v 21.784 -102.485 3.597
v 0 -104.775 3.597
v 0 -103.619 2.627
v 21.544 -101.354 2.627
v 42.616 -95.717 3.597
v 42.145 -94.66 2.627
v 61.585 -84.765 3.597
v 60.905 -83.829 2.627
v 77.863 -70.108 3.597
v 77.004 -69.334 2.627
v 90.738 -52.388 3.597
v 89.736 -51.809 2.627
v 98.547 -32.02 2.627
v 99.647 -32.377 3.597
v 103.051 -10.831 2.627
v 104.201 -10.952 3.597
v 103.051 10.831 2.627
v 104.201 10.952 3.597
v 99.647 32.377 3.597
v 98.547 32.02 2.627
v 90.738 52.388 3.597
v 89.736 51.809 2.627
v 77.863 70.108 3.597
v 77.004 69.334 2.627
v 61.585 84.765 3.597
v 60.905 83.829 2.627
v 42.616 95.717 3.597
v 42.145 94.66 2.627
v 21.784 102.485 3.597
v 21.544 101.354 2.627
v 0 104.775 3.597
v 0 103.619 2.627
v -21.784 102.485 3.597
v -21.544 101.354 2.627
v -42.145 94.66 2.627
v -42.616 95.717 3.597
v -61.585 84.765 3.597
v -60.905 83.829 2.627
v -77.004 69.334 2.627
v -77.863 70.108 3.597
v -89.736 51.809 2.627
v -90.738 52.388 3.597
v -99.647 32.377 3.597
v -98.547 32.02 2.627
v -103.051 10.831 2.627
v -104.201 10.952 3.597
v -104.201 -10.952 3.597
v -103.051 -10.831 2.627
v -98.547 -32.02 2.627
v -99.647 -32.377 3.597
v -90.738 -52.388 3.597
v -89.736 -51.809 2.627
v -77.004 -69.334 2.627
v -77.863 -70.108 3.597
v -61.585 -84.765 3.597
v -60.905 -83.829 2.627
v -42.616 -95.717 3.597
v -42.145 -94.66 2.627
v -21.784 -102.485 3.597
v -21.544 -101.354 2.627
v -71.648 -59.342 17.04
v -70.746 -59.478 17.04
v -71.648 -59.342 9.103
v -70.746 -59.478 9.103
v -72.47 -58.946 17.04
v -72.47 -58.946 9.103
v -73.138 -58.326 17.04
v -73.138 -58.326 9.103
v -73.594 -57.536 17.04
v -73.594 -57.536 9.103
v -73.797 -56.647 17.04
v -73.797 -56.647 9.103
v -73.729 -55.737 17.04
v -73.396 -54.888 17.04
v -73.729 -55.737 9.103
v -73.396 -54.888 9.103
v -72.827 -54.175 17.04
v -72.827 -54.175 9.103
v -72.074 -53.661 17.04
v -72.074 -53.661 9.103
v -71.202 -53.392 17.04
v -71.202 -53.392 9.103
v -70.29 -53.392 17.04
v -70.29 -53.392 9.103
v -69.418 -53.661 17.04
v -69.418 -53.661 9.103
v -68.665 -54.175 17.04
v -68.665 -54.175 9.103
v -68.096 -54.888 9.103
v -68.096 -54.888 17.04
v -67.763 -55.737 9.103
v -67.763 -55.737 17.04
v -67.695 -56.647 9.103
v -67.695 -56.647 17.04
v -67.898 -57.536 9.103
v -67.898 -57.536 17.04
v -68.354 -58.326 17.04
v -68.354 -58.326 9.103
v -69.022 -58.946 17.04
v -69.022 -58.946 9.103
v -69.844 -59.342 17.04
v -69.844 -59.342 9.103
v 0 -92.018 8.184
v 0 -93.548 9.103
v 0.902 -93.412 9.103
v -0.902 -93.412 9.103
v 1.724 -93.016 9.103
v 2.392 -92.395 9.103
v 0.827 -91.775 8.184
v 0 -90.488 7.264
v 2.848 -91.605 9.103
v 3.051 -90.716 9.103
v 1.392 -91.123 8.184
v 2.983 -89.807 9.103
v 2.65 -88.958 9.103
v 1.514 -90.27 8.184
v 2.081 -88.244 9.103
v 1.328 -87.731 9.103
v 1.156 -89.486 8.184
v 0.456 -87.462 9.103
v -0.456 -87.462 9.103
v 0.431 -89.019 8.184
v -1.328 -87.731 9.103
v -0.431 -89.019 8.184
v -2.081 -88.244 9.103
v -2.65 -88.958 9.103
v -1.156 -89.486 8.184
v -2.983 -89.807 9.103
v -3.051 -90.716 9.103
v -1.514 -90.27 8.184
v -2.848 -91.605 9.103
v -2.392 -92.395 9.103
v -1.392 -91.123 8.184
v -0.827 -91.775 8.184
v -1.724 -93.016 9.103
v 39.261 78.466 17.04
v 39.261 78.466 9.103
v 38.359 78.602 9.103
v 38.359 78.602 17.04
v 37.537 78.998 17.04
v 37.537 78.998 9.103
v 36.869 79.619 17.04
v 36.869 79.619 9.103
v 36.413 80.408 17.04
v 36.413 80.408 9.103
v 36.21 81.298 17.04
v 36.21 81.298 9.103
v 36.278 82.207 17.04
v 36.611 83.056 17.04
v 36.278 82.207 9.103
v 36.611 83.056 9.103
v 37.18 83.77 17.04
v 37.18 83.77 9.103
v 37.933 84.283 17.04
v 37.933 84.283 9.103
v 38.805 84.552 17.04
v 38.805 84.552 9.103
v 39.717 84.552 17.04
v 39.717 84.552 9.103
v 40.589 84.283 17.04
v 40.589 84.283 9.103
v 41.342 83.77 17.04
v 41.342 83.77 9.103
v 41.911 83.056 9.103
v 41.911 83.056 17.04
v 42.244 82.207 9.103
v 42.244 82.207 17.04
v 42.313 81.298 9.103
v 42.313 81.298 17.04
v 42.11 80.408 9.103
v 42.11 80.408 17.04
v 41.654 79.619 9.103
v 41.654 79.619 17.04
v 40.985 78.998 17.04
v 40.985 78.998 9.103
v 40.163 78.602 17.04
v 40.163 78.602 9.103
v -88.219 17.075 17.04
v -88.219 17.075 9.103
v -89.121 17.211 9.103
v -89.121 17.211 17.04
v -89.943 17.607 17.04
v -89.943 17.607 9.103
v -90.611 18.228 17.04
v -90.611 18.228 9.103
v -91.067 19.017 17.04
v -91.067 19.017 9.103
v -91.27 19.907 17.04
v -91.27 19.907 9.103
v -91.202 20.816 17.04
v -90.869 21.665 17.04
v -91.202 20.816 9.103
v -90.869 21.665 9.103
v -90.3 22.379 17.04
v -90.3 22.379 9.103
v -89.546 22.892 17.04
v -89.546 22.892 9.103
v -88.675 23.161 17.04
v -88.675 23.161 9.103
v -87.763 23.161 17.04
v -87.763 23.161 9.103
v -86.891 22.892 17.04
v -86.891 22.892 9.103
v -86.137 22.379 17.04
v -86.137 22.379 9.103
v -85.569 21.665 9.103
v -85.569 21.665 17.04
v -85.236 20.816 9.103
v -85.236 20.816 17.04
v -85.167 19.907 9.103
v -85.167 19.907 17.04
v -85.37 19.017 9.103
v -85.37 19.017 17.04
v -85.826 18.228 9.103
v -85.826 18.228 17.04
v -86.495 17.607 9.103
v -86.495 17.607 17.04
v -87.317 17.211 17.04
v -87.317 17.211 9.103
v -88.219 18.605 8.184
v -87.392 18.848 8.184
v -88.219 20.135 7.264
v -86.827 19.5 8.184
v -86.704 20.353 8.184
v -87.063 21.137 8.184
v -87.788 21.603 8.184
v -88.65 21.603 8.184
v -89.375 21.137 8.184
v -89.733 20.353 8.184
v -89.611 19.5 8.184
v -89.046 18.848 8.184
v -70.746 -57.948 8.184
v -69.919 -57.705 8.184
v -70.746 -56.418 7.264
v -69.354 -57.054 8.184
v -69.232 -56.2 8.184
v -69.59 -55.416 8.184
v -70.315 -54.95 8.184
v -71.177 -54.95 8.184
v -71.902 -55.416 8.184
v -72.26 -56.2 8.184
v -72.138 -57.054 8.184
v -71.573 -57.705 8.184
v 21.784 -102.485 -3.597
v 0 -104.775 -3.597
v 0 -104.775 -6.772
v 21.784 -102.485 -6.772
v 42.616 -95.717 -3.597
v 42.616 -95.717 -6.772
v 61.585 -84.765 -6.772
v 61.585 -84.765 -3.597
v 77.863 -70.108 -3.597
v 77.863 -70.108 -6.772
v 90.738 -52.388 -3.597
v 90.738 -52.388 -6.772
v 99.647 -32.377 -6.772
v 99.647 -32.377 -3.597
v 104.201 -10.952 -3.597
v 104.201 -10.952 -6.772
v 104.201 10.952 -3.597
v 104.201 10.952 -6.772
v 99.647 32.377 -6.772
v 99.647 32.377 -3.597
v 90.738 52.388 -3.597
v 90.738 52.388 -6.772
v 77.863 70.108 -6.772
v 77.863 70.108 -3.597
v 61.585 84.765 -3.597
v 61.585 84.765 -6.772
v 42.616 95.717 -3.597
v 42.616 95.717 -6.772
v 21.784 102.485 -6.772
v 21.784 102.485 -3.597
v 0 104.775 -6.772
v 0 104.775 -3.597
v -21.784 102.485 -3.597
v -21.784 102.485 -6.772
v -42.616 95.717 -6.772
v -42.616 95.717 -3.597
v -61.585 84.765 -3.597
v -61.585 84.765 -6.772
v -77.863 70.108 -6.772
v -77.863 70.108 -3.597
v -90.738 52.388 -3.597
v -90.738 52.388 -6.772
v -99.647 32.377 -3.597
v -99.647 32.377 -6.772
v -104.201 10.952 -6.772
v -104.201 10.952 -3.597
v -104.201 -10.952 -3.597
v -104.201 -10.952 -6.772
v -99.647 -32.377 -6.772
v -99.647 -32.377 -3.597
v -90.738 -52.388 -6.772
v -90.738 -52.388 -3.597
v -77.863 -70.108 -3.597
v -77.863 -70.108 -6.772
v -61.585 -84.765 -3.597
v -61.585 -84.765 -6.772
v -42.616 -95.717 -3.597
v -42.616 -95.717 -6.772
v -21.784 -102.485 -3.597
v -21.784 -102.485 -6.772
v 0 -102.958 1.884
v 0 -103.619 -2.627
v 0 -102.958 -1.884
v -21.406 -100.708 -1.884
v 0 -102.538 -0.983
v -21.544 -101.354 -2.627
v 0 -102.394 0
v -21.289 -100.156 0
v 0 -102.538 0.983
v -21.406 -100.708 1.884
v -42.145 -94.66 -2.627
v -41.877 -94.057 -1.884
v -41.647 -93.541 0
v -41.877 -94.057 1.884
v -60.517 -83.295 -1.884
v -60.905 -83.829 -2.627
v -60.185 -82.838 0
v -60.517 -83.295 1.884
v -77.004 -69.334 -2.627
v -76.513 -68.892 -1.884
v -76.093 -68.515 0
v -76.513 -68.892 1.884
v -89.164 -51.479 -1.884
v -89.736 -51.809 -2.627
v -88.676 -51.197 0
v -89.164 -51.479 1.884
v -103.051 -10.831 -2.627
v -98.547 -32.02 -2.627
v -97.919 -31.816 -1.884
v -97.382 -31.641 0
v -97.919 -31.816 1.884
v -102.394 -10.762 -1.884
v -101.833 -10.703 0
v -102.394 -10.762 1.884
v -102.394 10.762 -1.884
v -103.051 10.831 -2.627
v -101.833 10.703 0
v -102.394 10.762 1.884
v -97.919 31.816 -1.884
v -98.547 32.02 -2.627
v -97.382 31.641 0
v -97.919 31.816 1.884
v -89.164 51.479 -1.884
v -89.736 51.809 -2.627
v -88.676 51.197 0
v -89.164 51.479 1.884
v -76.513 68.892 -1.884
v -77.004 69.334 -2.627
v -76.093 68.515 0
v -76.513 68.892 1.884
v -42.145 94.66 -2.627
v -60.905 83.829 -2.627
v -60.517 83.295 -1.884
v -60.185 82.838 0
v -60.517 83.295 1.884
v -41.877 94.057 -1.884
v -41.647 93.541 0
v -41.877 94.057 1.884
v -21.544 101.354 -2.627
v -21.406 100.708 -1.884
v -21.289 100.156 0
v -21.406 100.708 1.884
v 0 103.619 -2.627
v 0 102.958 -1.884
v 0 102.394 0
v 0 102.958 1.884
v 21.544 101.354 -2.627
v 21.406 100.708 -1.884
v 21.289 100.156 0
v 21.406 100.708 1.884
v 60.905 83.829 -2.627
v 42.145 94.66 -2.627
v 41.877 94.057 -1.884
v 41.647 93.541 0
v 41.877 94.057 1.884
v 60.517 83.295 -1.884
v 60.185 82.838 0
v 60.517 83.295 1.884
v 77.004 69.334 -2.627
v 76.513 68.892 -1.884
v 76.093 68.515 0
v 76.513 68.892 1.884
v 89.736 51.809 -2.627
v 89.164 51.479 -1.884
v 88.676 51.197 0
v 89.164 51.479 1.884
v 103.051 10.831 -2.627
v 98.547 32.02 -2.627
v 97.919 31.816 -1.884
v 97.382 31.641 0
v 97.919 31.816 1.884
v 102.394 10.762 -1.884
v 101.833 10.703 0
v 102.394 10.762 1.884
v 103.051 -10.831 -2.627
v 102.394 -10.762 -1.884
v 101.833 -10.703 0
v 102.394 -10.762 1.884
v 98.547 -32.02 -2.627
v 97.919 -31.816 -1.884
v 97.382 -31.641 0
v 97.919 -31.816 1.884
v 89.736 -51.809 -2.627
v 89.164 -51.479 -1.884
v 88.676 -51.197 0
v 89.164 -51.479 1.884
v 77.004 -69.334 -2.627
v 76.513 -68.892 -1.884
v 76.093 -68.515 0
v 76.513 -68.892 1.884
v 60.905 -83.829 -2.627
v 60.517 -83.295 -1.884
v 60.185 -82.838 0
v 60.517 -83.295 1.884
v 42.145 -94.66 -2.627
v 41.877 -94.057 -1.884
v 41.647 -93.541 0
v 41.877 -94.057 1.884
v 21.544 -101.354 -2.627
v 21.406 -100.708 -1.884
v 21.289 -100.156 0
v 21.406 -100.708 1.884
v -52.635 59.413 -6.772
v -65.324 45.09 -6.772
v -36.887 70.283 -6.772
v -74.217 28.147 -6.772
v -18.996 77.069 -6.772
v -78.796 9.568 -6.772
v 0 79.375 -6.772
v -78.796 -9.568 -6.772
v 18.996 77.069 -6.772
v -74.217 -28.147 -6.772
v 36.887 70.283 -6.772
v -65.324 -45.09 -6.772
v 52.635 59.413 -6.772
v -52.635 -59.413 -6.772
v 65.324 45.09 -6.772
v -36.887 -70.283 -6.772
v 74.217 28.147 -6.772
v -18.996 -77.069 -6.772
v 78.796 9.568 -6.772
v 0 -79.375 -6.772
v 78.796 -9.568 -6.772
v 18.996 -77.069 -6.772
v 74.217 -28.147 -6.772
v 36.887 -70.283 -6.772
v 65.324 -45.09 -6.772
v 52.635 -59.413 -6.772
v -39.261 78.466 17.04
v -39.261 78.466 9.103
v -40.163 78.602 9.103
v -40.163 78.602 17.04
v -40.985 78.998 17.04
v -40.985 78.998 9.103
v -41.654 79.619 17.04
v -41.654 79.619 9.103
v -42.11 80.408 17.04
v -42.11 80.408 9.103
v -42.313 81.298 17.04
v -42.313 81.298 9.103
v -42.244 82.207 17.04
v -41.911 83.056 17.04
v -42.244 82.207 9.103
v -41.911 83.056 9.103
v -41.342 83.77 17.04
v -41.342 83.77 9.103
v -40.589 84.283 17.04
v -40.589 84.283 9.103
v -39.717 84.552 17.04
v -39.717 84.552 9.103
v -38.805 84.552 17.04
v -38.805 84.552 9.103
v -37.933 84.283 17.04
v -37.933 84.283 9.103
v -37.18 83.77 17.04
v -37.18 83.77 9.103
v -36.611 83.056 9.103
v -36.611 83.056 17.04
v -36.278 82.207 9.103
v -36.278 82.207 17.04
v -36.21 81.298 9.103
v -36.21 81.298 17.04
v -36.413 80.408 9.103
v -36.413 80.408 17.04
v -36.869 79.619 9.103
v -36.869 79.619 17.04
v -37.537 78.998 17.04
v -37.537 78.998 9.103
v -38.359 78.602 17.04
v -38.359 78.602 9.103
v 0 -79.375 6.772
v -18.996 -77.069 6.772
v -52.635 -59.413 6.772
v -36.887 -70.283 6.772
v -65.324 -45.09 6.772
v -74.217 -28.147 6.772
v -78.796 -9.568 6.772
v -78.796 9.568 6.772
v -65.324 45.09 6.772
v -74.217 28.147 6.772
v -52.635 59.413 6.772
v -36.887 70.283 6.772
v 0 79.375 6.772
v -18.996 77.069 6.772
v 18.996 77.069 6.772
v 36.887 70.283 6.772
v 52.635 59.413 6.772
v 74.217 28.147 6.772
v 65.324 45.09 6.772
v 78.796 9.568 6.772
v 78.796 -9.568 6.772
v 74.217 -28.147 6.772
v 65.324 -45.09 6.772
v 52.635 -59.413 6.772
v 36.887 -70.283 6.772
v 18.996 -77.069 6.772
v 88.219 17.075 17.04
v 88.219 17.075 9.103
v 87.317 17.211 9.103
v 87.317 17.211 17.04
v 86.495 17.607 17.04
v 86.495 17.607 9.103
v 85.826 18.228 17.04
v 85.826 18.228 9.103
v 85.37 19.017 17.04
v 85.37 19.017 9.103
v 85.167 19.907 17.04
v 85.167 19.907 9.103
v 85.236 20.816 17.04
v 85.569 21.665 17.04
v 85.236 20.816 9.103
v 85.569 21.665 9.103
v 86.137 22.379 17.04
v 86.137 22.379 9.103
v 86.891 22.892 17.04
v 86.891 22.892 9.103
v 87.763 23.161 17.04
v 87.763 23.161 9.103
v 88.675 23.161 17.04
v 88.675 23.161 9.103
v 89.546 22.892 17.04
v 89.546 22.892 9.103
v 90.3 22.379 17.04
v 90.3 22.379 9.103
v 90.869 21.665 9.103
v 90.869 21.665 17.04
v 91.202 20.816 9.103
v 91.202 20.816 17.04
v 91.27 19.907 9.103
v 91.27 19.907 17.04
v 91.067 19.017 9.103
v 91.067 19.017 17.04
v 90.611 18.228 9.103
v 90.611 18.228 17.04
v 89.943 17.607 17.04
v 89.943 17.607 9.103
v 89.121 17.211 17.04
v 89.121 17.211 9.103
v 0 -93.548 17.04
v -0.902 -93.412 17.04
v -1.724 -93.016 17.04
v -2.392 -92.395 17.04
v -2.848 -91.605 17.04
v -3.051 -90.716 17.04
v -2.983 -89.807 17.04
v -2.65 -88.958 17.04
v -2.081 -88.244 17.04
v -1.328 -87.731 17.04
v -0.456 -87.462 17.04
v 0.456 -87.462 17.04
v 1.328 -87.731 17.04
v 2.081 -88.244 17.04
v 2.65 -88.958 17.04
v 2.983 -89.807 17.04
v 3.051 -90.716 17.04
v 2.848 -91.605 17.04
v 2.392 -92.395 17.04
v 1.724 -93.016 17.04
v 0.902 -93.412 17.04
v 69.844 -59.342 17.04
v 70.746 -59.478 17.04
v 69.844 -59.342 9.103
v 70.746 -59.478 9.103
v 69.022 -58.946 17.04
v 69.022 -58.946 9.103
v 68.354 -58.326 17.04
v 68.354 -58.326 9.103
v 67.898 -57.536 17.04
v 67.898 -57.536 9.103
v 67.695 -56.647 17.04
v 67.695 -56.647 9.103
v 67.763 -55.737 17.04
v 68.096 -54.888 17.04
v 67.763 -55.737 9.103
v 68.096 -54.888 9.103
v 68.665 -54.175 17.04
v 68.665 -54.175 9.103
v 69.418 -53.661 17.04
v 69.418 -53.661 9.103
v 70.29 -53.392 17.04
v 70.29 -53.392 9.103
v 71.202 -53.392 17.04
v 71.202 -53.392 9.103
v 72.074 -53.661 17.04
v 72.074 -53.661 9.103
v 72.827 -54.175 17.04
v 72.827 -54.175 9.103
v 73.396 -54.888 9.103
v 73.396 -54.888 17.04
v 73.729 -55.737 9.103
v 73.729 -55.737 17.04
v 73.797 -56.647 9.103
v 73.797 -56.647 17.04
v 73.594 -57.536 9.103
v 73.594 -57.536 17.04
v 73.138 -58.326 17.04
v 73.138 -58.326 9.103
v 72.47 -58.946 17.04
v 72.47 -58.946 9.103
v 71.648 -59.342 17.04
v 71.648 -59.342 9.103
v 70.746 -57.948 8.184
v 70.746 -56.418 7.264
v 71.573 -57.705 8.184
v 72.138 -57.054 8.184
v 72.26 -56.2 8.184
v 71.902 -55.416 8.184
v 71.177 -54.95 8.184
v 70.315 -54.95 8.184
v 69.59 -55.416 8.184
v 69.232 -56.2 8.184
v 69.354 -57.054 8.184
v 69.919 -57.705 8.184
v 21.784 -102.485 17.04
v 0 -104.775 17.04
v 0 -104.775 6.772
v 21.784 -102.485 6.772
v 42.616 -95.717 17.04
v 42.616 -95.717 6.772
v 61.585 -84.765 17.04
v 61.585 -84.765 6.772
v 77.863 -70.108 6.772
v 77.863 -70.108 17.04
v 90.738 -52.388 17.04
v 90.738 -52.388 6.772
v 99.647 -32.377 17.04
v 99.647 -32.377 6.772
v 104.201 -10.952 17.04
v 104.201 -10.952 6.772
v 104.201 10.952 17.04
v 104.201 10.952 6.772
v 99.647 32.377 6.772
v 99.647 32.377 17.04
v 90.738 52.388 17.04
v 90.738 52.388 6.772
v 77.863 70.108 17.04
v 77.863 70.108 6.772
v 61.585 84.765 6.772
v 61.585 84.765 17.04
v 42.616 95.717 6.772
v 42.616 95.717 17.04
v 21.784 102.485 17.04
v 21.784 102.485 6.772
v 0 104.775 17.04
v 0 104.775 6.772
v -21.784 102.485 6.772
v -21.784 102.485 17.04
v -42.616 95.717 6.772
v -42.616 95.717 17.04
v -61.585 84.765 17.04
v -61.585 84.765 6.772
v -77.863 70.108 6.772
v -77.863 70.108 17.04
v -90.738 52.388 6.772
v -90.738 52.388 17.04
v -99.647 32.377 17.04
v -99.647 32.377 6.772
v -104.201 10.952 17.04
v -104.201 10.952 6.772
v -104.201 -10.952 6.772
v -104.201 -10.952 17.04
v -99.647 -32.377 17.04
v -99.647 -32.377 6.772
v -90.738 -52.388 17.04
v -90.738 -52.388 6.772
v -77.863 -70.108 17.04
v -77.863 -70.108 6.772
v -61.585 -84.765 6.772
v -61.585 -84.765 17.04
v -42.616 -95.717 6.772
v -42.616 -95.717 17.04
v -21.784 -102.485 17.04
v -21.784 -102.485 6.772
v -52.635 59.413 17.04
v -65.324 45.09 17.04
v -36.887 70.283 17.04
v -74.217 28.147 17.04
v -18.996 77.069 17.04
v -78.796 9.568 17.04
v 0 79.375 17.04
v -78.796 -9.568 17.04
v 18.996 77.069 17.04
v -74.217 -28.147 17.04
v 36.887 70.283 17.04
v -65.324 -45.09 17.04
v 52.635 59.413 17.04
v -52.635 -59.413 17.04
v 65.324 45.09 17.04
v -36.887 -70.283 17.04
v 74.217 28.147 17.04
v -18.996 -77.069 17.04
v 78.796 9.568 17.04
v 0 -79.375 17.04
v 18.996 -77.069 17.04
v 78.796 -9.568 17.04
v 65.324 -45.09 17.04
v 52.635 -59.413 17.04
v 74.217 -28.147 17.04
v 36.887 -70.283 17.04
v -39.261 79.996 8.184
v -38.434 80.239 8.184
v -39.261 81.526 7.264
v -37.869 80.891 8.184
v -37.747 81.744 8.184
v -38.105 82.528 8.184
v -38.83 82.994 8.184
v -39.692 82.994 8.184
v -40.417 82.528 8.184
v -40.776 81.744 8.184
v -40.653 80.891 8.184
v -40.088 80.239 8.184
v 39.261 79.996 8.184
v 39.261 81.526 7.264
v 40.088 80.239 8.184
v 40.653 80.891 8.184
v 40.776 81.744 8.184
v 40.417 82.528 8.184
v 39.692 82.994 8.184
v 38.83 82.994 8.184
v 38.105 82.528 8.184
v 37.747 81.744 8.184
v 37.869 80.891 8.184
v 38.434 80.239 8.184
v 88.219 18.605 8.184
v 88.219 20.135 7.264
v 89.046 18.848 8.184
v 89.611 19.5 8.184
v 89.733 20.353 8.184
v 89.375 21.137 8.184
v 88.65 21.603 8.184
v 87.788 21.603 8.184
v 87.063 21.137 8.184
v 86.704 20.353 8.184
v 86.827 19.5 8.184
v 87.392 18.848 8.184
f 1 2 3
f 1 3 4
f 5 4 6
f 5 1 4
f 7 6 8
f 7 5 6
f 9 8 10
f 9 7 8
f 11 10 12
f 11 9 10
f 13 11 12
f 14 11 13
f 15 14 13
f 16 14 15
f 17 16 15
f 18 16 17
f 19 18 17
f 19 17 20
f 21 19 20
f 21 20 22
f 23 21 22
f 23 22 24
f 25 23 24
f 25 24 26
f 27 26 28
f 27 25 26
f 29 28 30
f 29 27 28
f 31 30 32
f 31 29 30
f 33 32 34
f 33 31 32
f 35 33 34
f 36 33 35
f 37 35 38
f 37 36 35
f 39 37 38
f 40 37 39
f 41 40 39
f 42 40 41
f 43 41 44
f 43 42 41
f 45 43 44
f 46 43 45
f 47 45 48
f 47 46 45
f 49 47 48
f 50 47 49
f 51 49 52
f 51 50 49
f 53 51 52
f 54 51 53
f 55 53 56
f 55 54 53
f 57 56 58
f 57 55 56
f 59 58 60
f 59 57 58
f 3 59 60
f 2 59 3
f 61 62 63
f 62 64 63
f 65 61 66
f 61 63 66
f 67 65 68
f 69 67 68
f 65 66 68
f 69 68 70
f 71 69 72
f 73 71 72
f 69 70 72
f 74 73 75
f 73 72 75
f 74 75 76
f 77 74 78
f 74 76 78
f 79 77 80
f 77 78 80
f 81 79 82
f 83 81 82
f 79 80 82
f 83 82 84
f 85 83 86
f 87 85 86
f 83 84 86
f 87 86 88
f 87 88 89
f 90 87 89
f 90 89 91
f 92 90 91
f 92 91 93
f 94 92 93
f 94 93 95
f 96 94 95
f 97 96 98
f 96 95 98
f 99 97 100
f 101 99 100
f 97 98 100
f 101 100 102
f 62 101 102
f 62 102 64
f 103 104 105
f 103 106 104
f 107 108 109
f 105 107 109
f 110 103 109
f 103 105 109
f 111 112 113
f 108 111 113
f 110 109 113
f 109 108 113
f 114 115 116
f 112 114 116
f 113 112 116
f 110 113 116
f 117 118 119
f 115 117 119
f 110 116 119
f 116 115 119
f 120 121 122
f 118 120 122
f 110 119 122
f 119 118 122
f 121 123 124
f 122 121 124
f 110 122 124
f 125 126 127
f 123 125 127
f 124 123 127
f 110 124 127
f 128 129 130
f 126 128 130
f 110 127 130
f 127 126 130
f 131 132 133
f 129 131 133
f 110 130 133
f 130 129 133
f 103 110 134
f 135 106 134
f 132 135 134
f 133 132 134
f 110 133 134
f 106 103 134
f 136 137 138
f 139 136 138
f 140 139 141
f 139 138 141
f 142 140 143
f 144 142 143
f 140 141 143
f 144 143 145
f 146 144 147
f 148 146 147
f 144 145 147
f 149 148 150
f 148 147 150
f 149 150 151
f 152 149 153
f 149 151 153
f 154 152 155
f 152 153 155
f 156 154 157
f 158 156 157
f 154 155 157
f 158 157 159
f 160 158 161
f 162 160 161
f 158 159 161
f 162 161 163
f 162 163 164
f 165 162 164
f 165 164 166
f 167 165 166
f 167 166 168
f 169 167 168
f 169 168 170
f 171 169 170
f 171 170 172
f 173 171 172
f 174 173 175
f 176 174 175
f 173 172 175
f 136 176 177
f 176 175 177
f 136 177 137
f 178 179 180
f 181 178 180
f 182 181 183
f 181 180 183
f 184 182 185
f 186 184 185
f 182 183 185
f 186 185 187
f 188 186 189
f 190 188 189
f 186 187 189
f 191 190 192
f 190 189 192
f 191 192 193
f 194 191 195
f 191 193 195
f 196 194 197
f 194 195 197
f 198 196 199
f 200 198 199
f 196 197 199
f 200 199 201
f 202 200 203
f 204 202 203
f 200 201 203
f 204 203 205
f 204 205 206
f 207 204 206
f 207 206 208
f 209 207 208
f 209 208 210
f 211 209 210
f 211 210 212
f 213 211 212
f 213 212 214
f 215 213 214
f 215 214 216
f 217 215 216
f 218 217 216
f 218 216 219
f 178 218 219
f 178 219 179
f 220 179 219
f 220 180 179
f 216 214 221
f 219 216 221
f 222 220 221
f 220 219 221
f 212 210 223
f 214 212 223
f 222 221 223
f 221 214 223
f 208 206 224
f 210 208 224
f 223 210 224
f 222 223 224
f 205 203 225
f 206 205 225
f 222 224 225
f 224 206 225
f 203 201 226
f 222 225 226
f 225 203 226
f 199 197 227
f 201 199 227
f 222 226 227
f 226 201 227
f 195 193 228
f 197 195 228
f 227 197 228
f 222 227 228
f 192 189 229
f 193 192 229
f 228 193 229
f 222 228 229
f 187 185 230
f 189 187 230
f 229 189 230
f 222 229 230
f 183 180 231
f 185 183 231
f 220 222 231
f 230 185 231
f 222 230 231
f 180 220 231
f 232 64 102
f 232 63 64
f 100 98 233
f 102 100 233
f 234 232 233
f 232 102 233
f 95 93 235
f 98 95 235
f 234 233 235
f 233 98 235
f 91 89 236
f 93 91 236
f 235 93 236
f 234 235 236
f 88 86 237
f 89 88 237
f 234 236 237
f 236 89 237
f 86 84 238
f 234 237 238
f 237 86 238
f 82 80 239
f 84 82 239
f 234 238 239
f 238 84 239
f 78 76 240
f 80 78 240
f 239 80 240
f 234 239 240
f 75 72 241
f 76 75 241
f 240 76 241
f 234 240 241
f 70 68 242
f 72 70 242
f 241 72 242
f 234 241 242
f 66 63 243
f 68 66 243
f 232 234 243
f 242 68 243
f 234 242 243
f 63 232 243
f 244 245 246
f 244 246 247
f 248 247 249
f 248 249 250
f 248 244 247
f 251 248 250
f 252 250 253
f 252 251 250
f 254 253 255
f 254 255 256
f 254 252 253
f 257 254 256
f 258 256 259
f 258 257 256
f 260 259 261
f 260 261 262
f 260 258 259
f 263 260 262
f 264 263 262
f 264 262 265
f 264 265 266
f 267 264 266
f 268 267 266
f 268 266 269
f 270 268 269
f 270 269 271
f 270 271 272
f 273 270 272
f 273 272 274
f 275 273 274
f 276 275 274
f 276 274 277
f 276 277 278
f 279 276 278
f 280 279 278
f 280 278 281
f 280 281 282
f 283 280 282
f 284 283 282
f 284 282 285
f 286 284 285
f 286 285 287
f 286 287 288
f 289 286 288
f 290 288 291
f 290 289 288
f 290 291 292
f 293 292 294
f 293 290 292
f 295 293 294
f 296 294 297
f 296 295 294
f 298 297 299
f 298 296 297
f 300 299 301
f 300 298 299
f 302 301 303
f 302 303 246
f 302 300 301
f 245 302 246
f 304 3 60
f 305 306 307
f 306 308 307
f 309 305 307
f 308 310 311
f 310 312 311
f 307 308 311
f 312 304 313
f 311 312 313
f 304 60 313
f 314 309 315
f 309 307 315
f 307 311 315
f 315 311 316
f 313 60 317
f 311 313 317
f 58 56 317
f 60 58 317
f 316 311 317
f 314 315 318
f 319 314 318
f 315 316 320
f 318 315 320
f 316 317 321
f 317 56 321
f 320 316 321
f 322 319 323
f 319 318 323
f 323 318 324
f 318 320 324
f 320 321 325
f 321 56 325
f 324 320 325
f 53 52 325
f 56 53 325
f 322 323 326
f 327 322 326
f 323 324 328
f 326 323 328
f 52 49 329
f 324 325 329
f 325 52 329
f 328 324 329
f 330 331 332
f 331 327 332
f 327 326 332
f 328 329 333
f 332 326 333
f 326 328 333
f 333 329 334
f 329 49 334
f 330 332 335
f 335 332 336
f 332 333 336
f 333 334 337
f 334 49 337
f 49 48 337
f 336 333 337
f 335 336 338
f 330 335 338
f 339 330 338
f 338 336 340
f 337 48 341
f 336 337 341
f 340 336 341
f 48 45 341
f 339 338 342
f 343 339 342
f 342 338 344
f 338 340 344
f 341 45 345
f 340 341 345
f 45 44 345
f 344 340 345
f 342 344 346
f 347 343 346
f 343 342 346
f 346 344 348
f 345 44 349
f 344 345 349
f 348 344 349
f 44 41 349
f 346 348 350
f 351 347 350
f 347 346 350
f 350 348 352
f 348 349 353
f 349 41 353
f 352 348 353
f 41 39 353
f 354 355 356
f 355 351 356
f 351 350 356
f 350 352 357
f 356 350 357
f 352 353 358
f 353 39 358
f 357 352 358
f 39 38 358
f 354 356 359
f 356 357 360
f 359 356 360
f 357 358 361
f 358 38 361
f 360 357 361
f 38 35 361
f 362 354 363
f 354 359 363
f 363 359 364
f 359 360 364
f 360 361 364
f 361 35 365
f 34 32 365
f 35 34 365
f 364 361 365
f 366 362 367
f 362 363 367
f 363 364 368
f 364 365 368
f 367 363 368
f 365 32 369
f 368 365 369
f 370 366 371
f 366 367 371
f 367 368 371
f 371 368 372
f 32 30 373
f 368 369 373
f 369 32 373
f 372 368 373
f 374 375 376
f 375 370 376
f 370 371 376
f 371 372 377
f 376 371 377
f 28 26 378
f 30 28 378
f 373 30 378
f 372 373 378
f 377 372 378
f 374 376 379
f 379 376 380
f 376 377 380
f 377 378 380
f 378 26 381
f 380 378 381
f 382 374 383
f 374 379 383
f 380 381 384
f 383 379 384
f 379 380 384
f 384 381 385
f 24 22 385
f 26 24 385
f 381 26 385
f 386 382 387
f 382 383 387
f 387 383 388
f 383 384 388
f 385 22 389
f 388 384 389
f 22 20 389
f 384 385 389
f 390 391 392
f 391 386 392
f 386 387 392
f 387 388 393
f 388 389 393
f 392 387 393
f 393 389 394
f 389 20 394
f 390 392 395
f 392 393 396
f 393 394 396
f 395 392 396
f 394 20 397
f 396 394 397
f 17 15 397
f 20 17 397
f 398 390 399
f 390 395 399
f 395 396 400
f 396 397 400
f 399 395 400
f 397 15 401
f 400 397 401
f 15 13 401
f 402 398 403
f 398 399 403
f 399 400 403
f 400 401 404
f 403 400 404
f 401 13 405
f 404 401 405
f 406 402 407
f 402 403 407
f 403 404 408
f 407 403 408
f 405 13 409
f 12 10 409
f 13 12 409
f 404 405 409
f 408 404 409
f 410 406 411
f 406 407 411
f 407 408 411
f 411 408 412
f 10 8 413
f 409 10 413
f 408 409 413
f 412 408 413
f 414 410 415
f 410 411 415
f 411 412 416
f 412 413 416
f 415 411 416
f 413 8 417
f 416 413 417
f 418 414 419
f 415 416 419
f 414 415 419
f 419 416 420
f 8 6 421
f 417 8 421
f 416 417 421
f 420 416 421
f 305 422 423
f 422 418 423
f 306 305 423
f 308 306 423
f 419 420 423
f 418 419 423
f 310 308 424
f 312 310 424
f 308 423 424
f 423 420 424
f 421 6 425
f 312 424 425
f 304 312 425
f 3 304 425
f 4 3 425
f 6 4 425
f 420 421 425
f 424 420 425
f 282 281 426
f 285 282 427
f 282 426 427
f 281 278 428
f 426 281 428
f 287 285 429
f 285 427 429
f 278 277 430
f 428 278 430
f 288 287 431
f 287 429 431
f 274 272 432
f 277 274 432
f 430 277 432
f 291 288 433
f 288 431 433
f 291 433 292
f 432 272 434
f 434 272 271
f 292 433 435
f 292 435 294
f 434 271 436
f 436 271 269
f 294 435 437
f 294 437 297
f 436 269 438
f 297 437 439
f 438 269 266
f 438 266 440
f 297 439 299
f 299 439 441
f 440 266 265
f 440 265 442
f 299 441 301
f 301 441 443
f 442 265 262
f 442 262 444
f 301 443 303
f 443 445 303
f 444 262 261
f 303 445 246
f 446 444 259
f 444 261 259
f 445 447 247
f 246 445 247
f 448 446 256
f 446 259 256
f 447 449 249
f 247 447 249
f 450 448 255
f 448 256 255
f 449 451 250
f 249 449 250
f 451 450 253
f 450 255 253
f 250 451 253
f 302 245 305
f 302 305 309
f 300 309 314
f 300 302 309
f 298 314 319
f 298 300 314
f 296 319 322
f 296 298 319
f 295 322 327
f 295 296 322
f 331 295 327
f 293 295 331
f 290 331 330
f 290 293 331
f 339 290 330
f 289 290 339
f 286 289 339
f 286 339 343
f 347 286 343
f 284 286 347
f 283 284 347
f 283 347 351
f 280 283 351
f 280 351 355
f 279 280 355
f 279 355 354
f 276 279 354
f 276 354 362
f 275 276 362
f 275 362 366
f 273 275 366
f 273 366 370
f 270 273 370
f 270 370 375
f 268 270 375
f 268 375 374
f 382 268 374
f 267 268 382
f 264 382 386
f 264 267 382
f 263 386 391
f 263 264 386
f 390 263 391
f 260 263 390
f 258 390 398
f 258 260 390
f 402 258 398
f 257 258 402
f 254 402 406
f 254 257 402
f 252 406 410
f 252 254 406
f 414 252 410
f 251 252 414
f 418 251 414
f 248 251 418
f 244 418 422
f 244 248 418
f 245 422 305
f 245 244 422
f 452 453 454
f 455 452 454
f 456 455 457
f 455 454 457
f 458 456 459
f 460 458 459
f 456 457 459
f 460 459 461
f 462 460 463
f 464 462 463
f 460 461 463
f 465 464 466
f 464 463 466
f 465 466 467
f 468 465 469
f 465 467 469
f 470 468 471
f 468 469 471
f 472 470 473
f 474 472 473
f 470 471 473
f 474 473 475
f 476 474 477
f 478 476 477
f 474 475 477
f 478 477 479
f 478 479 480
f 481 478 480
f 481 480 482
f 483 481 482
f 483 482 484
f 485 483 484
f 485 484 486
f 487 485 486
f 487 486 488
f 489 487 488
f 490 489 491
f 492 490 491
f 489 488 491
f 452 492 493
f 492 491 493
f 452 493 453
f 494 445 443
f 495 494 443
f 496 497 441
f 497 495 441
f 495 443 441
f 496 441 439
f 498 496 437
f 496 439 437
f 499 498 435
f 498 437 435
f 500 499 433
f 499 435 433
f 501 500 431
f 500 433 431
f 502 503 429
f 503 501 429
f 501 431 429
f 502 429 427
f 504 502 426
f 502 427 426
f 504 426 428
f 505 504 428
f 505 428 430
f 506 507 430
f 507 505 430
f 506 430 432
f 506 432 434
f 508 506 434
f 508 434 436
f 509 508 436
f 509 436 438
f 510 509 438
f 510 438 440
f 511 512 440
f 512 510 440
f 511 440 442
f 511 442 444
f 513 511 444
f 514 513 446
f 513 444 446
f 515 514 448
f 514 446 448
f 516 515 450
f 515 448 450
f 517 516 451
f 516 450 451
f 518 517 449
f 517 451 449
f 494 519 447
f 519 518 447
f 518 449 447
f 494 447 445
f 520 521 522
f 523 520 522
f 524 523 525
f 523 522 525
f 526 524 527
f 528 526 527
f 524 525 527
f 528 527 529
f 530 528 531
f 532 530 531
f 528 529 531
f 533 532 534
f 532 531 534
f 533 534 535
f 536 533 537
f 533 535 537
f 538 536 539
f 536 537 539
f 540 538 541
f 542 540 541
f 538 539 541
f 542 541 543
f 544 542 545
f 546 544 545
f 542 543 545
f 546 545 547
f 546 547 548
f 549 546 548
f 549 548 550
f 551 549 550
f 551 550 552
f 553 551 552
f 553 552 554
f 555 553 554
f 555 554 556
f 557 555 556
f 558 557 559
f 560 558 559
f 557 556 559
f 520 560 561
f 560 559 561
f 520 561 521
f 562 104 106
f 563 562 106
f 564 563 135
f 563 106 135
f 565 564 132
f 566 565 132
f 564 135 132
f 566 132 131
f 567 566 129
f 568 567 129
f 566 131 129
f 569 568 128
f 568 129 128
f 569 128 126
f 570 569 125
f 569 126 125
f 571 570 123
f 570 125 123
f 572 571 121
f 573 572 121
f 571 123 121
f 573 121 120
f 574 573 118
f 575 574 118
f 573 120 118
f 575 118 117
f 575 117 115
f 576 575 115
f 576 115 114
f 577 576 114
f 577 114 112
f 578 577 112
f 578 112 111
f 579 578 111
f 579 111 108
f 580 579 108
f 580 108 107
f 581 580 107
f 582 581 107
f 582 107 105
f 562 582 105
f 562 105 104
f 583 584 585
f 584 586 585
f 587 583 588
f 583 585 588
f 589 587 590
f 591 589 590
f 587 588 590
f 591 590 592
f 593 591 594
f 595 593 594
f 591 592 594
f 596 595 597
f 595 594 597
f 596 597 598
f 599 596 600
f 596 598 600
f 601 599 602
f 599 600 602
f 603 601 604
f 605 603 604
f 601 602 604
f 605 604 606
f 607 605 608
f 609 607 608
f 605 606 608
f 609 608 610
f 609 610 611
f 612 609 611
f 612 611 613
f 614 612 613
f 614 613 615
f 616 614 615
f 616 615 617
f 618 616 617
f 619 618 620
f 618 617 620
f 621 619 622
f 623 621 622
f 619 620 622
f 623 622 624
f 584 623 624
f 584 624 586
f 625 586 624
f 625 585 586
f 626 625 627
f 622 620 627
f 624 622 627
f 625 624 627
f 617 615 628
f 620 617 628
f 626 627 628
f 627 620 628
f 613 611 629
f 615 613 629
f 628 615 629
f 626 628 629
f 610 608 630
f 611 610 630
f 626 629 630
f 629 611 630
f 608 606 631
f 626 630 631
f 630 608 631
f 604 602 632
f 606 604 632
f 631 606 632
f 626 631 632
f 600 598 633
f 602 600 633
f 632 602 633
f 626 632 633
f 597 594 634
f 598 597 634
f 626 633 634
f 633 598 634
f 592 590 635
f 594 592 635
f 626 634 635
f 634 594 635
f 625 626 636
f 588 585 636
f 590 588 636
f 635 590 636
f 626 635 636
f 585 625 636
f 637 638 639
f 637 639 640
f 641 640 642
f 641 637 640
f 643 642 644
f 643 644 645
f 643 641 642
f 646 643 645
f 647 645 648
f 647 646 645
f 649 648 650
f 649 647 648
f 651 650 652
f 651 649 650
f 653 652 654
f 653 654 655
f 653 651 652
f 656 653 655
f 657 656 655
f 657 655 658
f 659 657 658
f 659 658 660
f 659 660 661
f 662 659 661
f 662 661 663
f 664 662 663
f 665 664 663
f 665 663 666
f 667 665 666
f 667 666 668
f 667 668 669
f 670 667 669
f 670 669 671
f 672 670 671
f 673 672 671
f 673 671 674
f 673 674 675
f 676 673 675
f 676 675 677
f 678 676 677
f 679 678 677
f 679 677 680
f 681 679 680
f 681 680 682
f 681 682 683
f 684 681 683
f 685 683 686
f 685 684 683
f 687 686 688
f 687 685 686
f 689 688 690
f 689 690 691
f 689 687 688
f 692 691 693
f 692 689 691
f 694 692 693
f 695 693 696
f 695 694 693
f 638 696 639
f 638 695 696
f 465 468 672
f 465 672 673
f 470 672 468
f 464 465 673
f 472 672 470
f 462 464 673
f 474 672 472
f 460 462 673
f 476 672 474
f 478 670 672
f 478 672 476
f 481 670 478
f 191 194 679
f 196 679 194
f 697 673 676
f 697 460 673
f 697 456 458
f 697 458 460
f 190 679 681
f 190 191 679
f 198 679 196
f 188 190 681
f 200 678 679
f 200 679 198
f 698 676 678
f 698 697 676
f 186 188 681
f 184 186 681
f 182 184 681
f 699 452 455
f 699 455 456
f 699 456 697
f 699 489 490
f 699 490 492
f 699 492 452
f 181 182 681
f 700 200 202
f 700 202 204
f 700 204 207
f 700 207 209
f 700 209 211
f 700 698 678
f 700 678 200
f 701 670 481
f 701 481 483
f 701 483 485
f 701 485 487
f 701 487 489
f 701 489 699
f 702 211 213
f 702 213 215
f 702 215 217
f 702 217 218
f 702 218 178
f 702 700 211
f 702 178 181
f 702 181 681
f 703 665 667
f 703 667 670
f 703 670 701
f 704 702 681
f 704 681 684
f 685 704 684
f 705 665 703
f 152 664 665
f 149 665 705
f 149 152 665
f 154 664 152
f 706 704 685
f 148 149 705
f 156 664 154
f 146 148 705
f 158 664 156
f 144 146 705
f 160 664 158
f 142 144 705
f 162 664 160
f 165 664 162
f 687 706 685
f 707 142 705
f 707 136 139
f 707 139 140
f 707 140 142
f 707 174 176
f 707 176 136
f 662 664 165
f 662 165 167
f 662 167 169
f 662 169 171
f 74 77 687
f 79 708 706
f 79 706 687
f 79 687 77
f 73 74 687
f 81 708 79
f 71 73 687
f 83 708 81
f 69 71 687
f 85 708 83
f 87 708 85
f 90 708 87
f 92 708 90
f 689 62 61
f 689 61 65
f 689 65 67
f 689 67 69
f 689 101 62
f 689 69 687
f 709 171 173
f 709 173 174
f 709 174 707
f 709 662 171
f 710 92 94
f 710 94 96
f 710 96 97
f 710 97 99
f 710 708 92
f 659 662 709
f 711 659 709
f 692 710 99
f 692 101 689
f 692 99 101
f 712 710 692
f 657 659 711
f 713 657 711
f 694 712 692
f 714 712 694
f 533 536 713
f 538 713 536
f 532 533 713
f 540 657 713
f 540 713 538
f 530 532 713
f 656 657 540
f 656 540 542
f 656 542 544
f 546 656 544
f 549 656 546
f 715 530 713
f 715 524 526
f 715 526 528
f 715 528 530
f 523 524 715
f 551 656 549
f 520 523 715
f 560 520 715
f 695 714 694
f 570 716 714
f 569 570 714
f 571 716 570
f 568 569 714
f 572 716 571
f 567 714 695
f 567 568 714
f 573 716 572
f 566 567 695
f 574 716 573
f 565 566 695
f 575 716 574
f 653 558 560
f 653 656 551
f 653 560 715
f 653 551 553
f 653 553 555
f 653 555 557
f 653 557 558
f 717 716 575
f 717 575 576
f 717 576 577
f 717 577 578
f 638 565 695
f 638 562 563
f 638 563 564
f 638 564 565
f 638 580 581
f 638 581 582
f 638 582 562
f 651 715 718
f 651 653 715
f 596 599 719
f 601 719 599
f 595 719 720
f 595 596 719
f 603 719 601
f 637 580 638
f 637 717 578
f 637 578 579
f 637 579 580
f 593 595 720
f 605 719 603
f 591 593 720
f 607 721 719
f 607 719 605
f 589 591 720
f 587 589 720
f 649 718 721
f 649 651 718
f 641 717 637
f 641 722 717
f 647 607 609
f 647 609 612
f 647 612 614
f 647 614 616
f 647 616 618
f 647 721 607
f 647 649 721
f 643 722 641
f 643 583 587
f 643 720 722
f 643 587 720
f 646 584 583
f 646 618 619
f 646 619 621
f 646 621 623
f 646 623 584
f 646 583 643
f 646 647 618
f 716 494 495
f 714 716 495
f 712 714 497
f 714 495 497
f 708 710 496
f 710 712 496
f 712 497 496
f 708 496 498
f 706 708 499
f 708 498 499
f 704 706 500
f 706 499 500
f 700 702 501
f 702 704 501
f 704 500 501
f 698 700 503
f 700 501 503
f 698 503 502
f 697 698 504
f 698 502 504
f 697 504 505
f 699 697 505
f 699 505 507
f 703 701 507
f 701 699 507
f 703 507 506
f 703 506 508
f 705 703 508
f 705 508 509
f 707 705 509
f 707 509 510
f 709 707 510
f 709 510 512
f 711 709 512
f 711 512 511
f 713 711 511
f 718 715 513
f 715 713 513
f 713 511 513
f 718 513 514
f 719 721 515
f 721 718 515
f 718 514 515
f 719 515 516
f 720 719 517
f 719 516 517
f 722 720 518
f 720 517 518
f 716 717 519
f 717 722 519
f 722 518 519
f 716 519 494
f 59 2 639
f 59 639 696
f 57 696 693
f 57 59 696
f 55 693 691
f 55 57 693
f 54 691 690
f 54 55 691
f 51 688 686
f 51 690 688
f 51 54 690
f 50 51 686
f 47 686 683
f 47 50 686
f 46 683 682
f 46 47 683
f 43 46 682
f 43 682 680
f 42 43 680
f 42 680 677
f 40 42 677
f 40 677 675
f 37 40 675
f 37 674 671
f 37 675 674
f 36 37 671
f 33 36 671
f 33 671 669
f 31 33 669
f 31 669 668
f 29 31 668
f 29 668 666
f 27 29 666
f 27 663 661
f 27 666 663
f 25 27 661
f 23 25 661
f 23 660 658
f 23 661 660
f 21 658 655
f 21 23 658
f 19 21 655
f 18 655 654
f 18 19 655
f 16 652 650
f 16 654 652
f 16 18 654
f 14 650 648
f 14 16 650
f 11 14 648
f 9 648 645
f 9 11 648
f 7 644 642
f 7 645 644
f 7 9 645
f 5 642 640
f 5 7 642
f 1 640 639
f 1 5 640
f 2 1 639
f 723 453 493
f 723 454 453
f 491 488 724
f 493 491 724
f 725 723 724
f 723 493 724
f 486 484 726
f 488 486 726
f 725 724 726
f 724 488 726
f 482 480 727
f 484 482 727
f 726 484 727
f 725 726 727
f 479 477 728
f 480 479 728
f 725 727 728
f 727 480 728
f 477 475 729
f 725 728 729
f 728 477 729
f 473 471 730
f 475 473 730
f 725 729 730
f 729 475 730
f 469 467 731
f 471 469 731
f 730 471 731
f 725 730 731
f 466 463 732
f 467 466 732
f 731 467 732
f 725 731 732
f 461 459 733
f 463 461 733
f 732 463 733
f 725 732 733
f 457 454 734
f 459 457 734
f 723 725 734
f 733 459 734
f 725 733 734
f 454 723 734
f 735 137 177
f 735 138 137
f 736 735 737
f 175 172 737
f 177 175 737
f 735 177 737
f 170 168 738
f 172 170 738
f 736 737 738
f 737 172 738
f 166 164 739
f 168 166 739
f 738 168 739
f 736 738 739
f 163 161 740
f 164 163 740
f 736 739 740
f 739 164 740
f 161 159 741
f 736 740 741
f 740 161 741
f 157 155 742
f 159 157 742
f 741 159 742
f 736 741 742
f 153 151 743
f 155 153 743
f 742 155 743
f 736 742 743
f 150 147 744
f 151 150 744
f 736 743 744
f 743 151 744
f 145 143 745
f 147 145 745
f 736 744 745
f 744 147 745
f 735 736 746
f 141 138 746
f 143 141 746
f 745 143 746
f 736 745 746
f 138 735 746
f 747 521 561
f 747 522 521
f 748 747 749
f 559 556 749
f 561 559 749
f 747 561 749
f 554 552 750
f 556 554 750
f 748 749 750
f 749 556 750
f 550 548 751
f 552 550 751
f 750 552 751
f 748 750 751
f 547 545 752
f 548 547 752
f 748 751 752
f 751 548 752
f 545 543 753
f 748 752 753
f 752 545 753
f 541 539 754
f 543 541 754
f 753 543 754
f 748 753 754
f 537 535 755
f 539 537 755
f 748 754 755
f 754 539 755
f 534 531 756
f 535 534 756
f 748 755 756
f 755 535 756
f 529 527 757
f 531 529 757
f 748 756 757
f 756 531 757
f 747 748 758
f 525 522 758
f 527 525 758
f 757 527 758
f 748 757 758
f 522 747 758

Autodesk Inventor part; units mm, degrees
ref_plane "YZ Plane" through (0, 0, 0) normal (1, 0, 0) x (0, 1, 0)
ref_plane "XZ Plane" through (0, 0, 0) normal (0, 1, 0) x (-1, 0, 0)
ref_plane "XY Plane" through (0, 0, 0) normal (0, 0, 1) x (1, 0, 0)
sketch "Sketch1" plane through (0, 0, 0) normal (1, 0, 0) x (0, 1, 0)
  arc A0 (-107.5189, 2.6268) -> (-107.5189, -2.6268) centre (-105.3147, 0) ccw construction
  line L0 (-105.5687, 3.175) -> (-105.5687, -3.175) construction
  line L1 (-107.5189, 2.6268) -> (-107.5189, 4.635) construction
  line L2 (-106.3625, 6.7721) -> (-106.3625, 3.5971) construction
  line L3 (-107.5189, 2.6268) -> (-106.3625, 3.5971) construction
  line L4 (-107.5189, -2.6268) -> (-106.3625, -3.5971) construction
  line L5 (-131.7625, 6.7721) -> (-131.7625, -6.7721) construction
  line L6 (-131.7625, 6.7721) -> (-106.3625, 6.7721) construction
  line L7 (-131.7625, -6.7721) -> (-106.3625, -6.7721) construction
  line L8 (-106.3625, -6.7721) -> (-106.3625, -3.5971) construction
  circle A1 centre (-105.5687, 0) radius 3.175 construction
  line L9 (-35.1032, 0) -> (87.3968, 0) construction
  line L10 (-104.775, 6.7721) -> (-104.775, 3.5971)
  line L11 (-104.775, -6.7721) -> (-104.775, -3.5971)
  line L12 (-103.6186, 2.6268) -> (-104.775, 3.5971)
  line L13 (-103.6186, -2.6268) -> (-104.775, -3.5971)
  arc A2 (-103.6186, -2.6268) -> (-103.6186, 2.6268) centre (-105.8227, 0) ccw
  line L14 (-79.375, 6.7721) -> (-79.375, -6.7721)
  line L15 (0, -7.2584) -> (0, 7.2584) construction
  line L16 (-79.375, -6.7721) -> (-104.775, -6.7721)
  line L17 (-79.375, 6.7721) -> (-104.775, 6.7721) construction
  line L18 (-104.775, 6.7721) -> (-104.775, 17.0404)
  line L19 (-104.775, 17.0404) -> (-79.375, 17.0404)
  line L20 (-79.375, 17.0404) -> (-79.375, 6.7721)
  line L21 (-90.4875, 22.7342) -> (-90.4875, 17.0404) construction
  point P0 (0, 0)
  point P1 (0, 0)
  point P2 (-108.7437, 0)
  point P3 (-131.7625, 0)
  point P4 (-19.1031, 0)
  point P5 (0, 7.2584)
  point P6 (0, 0)
  point P7 (-143.7622, 15.4465)
  dimension "d0" = 6.35
  dimension "d1" = 3.429
  dimension "d2" = 50
  dimension "d3" = 3.175
  dimension "d4" = 1.5875
  dimension "d5" = 158.75
  dimension "d7" = 25.4
  dimension "d8" = 25.4
  dimension "d9" = 180.975
  dimension "d23" = 23.8125
revolve "Revolution1" add sketch "Sketch1" angle 360 about axis through (0, 0, -7.2584) along (0, 0, 1)
sketch "Sketch2" plane through (0, 0, 17.0404) normal (0, 0, 1) x (1, 0, 0)
  point P0 (0, 0)
  point P1 (0, -90.4875)
  point P2 (70.746, -56.418)
  point P3 (88.2188, 20.1354)
  point P4 (39.2611, 81.5264)
  point P5 (-39.2611, 81.5264)
  point P6 (-88.2188, 20.1354)
  point P7 (-70.746, -56.418)
  dimension "d11" = 90.4875
  dimension "d14" = 360
hole "Hole1" at (0, -90.4875, 17.0404) at (70.746, -56.418, 17.0404) at (88.2188, 20.1354, 17.0404) at (39.2611, 81.5264, 17.0404) at (-39.2611, 81.5264, 17.0404) at (-88.2188, 20.1354, 17.0404) at (-70.746, -56.418, 17.0404) direction (0, 0, -1) diameter 6.12 depth 7.9375 tip angle 118
equation "\"d8\" = d7"
properties part number "3DPRINT,TURRET,BEARING,INNER" material "Nylon 6/6"
